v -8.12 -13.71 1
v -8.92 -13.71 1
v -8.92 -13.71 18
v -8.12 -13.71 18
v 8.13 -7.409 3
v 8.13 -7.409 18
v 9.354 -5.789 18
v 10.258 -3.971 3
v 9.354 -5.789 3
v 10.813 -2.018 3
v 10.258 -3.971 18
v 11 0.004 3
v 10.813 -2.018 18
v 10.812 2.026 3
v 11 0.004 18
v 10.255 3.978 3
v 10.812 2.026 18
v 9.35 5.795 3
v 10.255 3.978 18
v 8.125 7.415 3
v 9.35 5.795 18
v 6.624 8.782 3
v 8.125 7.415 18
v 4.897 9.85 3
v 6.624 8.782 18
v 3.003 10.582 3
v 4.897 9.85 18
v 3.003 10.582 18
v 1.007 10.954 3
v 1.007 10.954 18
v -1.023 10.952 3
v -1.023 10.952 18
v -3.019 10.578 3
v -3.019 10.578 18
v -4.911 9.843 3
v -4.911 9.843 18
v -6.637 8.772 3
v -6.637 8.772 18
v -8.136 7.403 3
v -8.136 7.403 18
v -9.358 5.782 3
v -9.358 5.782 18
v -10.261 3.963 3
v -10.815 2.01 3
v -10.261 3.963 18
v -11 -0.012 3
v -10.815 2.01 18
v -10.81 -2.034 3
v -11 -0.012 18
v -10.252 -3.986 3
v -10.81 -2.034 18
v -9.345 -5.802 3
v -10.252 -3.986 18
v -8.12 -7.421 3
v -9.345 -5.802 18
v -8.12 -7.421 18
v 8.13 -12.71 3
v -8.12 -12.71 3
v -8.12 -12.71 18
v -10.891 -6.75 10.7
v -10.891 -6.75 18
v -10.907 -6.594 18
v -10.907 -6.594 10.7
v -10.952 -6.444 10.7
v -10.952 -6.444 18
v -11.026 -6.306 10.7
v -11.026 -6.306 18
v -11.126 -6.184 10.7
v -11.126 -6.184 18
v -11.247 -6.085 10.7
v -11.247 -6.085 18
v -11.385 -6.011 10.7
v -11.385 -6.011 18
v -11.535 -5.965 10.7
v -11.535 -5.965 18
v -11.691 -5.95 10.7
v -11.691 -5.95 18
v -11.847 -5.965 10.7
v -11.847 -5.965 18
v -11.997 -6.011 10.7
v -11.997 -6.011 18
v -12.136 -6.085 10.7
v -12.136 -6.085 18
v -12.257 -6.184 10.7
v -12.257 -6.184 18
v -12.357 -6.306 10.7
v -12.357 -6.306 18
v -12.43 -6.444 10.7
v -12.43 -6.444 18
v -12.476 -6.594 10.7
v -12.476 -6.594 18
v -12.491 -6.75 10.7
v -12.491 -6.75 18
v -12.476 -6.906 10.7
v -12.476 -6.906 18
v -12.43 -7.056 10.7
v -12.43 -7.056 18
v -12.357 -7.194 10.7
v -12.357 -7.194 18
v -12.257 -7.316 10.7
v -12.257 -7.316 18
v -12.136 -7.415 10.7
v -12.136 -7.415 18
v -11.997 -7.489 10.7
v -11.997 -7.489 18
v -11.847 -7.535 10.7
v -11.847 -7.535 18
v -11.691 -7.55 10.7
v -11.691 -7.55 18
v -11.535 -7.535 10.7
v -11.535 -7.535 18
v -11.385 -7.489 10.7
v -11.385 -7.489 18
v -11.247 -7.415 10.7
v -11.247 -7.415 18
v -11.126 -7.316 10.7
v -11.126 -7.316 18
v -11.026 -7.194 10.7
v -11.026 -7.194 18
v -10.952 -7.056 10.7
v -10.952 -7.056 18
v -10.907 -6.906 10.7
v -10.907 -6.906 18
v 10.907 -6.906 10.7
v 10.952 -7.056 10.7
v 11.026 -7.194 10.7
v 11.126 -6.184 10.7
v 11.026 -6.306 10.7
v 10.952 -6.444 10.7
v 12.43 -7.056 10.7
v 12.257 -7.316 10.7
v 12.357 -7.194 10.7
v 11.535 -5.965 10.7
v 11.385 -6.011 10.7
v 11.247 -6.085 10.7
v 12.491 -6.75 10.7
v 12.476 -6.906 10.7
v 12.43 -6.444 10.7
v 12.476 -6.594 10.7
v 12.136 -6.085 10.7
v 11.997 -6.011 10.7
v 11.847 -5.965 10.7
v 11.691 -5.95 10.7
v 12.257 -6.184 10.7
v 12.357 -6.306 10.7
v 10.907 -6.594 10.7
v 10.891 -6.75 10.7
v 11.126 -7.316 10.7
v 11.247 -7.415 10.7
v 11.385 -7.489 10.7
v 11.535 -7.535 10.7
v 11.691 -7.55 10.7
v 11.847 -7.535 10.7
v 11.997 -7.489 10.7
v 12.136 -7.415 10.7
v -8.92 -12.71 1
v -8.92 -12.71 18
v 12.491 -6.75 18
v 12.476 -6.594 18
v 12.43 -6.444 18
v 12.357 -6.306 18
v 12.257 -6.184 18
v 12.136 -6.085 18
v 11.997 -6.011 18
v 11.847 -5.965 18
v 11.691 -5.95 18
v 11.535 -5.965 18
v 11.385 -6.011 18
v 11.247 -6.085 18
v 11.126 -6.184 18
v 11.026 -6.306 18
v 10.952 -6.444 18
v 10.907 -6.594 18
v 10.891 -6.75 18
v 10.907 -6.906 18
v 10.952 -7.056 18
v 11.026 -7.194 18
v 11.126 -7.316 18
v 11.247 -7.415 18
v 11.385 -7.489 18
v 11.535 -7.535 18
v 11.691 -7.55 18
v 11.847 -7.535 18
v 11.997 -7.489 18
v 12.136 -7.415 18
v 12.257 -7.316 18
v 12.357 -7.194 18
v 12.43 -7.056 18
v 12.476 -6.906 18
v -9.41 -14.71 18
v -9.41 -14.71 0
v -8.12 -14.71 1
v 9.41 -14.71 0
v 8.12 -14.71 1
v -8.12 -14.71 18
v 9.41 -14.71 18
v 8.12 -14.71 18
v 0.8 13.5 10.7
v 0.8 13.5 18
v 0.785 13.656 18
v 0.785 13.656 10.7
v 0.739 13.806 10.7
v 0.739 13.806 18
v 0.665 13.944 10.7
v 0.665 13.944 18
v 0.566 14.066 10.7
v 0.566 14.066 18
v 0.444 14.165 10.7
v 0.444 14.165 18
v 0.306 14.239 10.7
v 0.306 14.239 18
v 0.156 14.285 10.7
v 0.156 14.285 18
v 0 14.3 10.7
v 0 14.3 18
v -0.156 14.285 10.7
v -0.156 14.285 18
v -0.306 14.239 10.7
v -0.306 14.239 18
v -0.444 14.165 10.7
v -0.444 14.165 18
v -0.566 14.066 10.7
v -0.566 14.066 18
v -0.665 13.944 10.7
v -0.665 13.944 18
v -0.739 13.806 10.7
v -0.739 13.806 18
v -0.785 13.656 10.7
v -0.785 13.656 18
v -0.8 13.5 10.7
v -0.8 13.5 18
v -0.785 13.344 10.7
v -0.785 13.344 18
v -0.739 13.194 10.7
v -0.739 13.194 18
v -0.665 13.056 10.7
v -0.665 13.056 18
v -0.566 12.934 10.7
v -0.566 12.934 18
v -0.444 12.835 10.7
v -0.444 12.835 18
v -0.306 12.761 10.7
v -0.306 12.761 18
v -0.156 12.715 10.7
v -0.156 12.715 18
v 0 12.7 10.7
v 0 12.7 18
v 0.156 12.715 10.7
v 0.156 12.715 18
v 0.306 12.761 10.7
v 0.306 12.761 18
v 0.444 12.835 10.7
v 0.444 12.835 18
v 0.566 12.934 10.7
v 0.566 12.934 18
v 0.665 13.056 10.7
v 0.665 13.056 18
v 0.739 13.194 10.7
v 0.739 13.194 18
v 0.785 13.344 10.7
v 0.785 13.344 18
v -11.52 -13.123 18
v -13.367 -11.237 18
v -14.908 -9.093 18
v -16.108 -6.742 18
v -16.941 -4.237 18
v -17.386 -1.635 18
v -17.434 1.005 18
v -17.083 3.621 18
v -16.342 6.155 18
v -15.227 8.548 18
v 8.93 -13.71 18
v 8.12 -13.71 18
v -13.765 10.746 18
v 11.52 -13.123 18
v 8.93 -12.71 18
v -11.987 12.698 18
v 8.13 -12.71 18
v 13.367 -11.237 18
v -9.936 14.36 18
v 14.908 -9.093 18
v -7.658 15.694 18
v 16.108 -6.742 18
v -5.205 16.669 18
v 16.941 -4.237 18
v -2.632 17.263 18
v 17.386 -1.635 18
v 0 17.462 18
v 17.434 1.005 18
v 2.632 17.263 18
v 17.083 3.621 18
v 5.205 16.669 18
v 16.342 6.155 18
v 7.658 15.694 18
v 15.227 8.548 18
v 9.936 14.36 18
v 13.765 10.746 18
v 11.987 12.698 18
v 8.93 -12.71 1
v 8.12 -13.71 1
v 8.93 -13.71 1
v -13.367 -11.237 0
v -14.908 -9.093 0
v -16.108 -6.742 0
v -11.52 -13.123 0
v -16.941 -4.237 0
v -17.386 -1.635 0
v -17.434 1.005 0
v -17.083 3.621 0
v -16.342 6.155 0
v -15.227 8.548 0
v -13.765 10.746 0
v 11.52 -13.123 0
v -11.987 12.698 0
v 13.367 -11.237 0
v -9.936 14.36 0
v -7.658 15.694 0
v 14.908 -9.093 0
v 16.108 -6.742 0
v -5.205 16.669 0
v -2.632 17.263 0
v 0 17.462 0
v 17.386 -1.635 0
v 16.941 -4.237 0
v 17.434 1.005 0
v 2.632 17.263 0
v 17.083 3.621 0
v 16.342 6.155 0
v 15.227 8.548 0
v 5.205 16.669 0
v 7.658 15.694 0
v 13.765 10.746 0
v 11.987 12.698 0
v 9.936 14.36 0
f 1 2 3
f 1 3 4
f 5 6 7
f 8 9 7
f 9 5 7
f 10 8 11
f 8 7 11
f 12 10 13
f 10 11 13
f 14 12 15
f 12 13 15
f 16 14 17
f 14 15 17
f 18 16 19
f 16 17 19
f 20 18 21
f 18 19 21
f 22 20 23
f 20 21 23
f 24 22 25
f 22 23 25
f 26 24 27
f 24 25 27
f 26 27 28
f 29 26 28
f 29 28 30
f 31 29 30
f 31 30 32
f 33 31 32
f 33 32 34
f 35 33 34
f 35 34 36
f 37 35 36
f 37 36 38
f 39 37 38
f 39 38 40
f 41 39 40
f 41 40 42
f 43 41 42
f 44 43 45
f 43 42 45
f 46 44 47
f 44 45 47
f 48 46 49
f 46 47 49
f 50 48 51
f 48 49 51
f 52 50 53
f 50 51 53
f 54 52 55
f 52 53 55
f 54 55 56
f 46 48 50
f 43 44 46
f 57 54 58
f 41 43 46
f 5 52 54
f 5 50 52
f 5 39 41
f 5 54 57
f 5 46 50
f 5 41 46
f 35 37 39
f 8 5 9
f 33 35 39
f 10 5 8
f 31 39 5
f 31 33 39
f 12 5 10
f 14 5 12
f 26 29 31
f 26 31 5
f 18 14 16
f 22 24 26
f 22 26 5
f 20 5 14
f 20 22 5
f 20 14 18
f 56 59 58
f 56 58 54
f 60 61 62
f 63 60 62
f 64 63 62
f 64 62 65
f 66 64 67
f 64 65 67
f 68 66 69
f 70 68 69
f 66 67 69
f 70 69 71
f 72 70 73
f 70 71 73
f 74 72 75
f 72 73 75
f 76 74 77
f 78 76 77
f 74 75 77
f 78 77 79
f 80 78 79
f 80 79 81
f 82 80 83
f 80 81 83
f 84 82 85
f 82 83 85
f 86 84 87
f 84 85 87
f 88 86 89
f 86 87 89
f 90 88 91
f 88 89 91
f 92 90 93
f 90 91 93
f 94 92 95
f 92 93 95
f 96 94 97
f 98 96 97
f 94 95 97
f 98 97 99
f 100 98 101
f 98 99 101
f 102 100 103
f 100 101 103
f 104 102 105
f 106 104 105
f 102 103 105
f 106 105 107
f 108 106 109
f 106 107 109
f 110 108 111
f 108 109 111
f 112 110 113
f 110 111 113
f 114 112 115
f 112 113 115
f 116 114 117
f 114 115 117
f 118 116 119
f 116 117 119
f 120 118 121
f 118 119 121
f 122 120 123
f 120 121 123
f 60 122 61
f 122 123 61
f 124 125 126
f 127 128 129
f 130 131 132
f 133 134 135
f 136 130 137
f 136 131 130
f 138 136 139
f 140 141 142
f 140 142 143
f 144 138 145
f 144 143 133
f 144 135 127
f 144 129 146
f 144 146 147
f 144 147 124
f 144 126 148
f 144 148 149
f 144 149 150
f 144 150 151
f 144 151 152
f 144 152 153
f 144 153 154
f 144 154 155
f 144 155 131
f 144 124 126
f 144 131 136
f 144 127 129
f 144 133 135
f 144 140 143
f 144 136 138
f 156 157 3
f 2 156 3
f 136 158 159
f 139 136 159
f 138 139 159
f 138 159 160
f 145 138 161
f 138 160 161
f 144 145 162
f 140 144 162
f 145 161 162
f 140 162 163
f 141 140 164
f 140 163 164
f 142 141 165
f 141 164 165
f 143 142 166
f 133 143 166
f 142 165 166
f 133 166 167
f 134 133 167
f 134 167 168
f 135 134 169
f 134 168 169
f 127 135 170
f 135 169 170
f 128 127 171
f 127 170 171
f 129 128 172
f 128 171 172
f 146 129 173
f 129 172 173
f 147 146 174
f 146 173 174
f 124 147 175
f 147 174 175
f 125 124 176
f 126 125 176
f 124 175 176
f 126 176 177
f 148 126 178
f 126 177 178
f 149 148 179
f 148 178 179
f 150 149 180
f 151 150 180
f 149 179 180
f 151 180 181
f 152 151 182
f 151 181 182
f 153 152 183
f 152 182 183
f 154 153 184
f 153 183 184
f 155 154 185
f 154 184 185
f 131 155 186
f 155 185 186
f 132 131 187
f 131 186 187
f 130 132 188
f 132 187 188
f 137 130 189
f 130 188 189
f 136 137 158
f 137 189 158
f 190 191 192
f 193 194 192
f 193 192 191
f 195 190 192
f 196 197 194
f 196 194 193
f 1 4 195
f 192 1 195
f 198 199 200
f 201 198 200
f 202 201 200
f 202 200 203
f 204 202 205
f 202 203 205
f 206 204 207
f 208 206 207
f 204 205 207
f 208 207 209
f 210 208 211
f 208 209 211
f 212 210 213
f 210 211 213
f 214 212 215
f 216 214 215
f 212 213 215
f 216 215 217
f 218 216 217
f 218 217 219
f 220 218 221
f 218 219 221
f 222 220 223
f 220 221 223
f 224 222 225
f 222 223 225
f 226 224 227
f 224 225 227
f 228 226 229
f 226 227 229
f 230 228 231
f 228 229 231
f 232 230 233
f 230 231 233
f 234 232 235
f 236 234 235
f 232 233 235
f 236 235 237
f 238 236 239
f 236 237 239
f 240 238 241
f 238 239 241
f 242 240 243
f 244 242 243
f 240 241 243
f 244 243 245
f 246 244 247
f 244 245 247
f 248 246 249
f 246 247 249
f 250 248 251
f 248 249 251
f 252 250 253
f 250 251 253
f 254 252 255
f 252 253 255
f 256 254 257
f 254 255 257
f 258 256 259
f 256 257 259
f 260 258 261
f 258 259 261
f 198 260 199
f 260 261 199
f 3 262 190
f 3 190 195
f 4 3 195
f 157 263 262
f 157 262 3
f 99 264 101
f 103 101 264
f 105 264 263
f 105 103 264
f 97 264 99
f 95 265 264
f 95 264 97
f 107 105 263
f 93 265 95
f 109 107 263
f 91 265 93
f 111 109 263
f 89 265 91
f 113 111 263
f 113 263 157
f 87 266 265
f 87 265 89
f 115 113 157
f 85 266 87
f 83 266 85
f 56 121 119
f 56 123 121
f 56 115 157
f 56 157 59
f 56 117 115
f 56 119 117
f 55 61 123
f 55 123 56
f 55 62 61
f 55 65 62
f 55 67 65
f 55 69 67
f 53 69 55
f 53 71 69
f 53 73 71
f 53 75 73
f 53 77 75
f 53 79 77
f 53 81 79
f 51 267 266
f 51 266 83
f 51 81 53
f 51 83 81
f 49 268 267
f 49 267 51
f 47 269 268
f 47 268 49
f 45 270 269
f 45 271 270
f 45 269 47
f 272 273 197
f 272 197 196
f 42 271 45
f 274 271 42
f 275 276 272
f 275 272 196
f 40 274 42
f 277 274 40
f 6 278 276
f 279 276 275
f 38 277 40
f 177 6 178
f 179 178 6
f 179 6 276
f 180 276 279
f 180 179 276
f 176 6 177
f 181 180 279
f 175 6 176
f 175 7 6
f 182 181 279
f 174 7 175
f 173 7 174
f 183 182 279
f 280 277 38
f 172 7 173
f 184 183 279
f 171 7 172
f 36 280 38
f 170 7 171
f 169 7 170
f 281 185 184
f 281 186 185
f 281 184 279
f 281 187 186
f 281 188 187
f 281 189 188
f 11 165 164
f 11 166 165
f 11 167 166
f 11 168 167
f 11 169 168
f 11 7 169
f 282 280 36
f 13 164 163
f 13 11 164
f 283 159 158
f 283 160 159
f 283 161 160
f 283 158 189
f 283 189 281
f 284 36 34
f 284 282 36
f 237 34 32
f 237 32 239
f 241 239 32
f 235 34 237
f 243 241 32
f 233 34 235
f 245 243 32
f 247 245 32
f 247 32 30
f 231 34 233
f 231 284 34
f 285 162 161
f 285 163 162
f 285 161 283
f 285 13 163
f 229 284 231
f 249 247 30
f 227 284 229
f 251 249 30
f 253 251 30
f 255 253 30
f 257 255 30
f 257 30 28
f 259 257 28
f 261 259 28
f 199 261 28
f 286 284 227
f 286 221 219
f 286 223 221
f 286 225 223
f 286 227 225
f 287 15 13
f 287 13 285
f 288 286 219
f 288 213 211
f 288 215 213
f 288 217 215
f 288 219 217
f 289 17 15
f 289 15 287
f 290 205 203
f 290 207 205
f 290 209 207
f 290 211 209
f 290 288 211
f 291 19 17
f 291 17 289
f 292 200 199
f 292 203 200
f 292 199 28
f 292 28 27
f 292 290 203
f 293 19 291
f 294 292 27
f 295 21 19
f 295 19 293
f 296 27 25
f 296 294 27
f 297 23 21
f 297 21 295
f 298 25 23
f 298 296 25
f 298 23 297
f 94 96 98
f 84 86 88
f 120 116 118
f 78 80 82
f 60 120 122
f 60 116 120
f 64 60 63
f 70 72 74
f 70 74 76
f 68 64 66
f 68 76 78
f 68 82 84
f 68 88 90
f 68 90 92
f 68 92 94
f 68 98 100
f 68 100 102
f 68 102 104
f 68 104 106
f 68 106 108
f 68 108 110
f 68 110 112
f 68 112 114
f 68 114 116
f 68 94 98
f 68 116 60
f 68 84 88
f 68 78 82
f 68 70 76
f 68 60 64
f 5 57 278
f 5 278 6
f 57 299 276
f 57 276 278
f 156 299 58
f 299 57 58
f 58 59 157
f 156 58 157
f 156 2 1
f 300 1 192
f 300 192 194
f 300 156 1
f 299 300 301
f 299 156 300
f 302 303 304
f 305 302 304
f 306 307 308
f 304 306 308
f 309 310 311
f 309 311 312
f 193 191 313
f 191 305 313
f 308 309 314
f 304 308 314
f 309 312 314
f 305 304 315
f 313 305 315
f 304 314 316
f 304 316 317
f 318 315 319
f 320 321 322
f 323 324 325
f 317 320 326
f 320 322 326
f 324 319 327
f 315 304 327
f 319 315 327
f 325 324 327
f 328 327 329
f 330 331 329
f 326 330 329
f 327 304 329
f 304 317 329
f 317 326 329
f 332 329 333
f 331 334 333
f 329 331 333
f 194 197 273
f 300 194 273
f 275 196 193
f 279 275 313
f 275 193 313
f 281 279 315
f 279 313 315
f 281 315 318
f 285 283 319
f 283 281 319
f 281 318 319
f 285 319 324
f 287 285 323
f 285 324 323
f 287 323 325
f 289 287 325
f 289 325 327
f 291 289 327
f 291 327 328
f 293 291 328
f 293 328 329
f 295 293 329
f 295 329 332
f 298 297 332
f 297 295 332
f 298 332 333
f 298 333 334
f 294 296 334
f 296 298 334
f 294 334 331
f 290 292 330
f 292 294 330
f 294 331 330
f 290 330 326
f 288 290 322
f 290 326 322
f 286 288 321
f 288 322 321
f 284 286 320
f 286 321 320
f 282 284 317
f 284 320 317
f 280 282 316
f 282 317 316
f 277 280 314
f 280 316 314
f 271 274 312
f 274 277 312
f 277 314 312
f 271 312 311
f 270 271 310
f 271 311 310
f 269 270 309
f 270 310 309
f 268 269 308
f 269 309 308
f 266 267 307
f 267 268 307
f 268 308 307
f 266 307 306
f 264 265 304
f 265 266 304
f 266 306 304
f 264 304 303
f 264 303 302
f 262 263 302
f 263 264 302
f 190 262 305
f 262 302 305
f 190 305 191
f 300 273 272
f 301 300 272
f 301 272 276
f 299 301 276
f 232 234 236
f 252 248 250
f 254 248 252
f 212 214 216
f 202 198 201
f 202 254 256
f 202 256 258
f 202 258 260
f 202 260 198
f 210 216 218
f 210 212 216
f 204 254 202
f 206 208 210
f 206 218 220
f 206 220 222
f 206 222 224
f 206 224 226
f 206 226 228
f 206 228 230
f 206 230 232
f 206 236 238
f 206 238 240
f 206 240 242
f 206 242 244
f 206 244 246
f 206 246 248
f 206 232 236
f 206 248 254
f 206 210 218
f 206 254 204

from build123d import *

# Parameters (mm, degrees)
SKETCH2_R           = 17.4625
BOSS_EXTRUDE1_DEPTH = 18
SKETCH13_R          = 0.8
CUT_EXTRUDE6_DEPTH  = 7.3
SKETCH16_R          = 11
CUT_EXTRUDE9_DEPTH  = 15
CUT_EXTRUDE11_DEPTH = 22
SKETCH21_W          = 16.25
SKETCH21_H          = 2.78436417
CUT_EXTRUDE12_DEPTH = 31.559414466
CUT_EXTRUDE13_REACH = 32.559
SKETCH24_W          = 16.25
SKETCH24_H          = 6.70136321
CUT_EXTRUDE14_DEPTH = 17
SKETCH27_W          = 18.82071266
SKETCH27_H          = 0.75
CUT_EXTRUDE15_DEPTH = 31.559414466


with BuildPart() as part:
    # Sketch2 → Boss-Extrude1 (new body)
    with BuildSketch(Plane.XY):
        Circle(SKETCH2_R)
    extrude(amount=BOSS_EXTRUDE1_DEPTH)

    # Sketch13 → Cut-Extrude6 (cut)
    with BuildSketch(Plane.XY.offset(18)):
        with Locations((0, 13.5)):
            Circle(SKETCH13_R)
        with Locations((11.691342951, -6.75)):
            Circle(SKETCH13_R)
        with Locations((-11.691342951, -6.75)):
            Circle(SKETCH13_R)
    extrude(amount=-CUT_EXTRUDE6_DEPTH, mode=Mode.SUBTRACT)

    # Sketch16 → Cut-Extrude9 (cut)
    with BuildSketch(Plane.XY.offset(18)):
        Circle(SKETCH16_R)
    extrude(amount=-CUT_EXTRUDE9_DEPTH, mode=Mode.SUBTRACT)

    # Sketch20 → Cut-Extrude11 (cut)
    with BuildSketch(Plane(origin=(5.95728493, 0, -11.08430825), x_dir=(0, 0, 1), z_dir=(0, 1, 0))):
        Polygon((16.52930825, -11.021800725), (16.52930825, -6.906800725), (14.92930825, -6.906800725), (14.92930825, -4.926800725), (16.52930825, -4.926800725), (16.52930825, -0.811800725), (18.05430825, -0.811800725), (18.05430825, 1.028199275), (22.11430825, 1.028199275), (22.11430825, -0.811800725), (23.63930825, -0.811800725), (23.63930825, -11.021800725), (22.11430825, -11.021800725), (22.11430825, -12.861800725), (18.05430825, -12.861800725), (18.05430825, -11.021800725), align=None)
    extrude(amount=-CUT_EXTRUDE11_DEPTH, mode=Mode.SUBTRACT)

    # Sketch21 → Cut-Extrude12 (cut, through all)
    with BuildSketch(Plane.XY.offset(18)):
        with Locations((0, -16.852182085)):
            Rectangle(SKETCH21_W, SKETCH21_H)
    extrude(amount=-CUT_EXTRUDE12_DEPTH, mode=Mode.SUBTRACT)

    # Cut-Extrude13: up to this face of the body (flat: up to its plane)
    cut_extrude13_end = Plane(part.part.faces().sort_by_distance((0, 0, 3))[0])
    # Sketch24 → Cut-Extrude13 (cut, up to the picked face)
    with BuildSketch(Plane.XY.offset(18), mode=Mode.PRIVATE) as cut_extrude13_sk1:
        with Locations((0.005436819, -10.109318395)):
            Rectangle(SKETCH24_W, SKETCH24_H)
    cut_extrude13_tool1 = split(extrude(cut_extrude13_sk1.sketch, amount=-CUT_EXTRUDE13_REACH, mode=Mode.PRIVATE), bisect_by=cut_extrude13_end, keep=Keep.BOTH, mode=Mode.PRIVATE)
    add(cut_extrude13_tool1.solids().sort_by(Axis((0.005437, -10.109318, 18), (0, 0, -1)))[0], mode=Mode.SUBTRACT)

    # Sketch26 → Cut-Extrude14 (cut)
    with BuildSketch(Plane.XY.offset(18)):
        Polygon((-8.119563181, -13.71), (-8.119563181, -15.46), (8.119563181, -15.46), (8.119563181, -13.71), (8.930436819, -13.71), (8.930436819, -12.71), (-8.919563181, -12.71), (-8.919563181, -13.71), align=None)
    extrude(amount=-CUT_EXTRUDE14_DEPTH, mode=Mode.SUBTRACT)

    # Sketch27 → Cut-Extrude15 (cut, through all)
    with BuildSketch(Plane.XY.offset(18)):
        with Locations((0, -15.085)):
            Rectangle(SKETCH27_W, SKETCH27_H)
    extrude(amount=-CUT_EXTRUDE15_DEPTH, mode=Mode.SUBTRACT)


solid = part.part
